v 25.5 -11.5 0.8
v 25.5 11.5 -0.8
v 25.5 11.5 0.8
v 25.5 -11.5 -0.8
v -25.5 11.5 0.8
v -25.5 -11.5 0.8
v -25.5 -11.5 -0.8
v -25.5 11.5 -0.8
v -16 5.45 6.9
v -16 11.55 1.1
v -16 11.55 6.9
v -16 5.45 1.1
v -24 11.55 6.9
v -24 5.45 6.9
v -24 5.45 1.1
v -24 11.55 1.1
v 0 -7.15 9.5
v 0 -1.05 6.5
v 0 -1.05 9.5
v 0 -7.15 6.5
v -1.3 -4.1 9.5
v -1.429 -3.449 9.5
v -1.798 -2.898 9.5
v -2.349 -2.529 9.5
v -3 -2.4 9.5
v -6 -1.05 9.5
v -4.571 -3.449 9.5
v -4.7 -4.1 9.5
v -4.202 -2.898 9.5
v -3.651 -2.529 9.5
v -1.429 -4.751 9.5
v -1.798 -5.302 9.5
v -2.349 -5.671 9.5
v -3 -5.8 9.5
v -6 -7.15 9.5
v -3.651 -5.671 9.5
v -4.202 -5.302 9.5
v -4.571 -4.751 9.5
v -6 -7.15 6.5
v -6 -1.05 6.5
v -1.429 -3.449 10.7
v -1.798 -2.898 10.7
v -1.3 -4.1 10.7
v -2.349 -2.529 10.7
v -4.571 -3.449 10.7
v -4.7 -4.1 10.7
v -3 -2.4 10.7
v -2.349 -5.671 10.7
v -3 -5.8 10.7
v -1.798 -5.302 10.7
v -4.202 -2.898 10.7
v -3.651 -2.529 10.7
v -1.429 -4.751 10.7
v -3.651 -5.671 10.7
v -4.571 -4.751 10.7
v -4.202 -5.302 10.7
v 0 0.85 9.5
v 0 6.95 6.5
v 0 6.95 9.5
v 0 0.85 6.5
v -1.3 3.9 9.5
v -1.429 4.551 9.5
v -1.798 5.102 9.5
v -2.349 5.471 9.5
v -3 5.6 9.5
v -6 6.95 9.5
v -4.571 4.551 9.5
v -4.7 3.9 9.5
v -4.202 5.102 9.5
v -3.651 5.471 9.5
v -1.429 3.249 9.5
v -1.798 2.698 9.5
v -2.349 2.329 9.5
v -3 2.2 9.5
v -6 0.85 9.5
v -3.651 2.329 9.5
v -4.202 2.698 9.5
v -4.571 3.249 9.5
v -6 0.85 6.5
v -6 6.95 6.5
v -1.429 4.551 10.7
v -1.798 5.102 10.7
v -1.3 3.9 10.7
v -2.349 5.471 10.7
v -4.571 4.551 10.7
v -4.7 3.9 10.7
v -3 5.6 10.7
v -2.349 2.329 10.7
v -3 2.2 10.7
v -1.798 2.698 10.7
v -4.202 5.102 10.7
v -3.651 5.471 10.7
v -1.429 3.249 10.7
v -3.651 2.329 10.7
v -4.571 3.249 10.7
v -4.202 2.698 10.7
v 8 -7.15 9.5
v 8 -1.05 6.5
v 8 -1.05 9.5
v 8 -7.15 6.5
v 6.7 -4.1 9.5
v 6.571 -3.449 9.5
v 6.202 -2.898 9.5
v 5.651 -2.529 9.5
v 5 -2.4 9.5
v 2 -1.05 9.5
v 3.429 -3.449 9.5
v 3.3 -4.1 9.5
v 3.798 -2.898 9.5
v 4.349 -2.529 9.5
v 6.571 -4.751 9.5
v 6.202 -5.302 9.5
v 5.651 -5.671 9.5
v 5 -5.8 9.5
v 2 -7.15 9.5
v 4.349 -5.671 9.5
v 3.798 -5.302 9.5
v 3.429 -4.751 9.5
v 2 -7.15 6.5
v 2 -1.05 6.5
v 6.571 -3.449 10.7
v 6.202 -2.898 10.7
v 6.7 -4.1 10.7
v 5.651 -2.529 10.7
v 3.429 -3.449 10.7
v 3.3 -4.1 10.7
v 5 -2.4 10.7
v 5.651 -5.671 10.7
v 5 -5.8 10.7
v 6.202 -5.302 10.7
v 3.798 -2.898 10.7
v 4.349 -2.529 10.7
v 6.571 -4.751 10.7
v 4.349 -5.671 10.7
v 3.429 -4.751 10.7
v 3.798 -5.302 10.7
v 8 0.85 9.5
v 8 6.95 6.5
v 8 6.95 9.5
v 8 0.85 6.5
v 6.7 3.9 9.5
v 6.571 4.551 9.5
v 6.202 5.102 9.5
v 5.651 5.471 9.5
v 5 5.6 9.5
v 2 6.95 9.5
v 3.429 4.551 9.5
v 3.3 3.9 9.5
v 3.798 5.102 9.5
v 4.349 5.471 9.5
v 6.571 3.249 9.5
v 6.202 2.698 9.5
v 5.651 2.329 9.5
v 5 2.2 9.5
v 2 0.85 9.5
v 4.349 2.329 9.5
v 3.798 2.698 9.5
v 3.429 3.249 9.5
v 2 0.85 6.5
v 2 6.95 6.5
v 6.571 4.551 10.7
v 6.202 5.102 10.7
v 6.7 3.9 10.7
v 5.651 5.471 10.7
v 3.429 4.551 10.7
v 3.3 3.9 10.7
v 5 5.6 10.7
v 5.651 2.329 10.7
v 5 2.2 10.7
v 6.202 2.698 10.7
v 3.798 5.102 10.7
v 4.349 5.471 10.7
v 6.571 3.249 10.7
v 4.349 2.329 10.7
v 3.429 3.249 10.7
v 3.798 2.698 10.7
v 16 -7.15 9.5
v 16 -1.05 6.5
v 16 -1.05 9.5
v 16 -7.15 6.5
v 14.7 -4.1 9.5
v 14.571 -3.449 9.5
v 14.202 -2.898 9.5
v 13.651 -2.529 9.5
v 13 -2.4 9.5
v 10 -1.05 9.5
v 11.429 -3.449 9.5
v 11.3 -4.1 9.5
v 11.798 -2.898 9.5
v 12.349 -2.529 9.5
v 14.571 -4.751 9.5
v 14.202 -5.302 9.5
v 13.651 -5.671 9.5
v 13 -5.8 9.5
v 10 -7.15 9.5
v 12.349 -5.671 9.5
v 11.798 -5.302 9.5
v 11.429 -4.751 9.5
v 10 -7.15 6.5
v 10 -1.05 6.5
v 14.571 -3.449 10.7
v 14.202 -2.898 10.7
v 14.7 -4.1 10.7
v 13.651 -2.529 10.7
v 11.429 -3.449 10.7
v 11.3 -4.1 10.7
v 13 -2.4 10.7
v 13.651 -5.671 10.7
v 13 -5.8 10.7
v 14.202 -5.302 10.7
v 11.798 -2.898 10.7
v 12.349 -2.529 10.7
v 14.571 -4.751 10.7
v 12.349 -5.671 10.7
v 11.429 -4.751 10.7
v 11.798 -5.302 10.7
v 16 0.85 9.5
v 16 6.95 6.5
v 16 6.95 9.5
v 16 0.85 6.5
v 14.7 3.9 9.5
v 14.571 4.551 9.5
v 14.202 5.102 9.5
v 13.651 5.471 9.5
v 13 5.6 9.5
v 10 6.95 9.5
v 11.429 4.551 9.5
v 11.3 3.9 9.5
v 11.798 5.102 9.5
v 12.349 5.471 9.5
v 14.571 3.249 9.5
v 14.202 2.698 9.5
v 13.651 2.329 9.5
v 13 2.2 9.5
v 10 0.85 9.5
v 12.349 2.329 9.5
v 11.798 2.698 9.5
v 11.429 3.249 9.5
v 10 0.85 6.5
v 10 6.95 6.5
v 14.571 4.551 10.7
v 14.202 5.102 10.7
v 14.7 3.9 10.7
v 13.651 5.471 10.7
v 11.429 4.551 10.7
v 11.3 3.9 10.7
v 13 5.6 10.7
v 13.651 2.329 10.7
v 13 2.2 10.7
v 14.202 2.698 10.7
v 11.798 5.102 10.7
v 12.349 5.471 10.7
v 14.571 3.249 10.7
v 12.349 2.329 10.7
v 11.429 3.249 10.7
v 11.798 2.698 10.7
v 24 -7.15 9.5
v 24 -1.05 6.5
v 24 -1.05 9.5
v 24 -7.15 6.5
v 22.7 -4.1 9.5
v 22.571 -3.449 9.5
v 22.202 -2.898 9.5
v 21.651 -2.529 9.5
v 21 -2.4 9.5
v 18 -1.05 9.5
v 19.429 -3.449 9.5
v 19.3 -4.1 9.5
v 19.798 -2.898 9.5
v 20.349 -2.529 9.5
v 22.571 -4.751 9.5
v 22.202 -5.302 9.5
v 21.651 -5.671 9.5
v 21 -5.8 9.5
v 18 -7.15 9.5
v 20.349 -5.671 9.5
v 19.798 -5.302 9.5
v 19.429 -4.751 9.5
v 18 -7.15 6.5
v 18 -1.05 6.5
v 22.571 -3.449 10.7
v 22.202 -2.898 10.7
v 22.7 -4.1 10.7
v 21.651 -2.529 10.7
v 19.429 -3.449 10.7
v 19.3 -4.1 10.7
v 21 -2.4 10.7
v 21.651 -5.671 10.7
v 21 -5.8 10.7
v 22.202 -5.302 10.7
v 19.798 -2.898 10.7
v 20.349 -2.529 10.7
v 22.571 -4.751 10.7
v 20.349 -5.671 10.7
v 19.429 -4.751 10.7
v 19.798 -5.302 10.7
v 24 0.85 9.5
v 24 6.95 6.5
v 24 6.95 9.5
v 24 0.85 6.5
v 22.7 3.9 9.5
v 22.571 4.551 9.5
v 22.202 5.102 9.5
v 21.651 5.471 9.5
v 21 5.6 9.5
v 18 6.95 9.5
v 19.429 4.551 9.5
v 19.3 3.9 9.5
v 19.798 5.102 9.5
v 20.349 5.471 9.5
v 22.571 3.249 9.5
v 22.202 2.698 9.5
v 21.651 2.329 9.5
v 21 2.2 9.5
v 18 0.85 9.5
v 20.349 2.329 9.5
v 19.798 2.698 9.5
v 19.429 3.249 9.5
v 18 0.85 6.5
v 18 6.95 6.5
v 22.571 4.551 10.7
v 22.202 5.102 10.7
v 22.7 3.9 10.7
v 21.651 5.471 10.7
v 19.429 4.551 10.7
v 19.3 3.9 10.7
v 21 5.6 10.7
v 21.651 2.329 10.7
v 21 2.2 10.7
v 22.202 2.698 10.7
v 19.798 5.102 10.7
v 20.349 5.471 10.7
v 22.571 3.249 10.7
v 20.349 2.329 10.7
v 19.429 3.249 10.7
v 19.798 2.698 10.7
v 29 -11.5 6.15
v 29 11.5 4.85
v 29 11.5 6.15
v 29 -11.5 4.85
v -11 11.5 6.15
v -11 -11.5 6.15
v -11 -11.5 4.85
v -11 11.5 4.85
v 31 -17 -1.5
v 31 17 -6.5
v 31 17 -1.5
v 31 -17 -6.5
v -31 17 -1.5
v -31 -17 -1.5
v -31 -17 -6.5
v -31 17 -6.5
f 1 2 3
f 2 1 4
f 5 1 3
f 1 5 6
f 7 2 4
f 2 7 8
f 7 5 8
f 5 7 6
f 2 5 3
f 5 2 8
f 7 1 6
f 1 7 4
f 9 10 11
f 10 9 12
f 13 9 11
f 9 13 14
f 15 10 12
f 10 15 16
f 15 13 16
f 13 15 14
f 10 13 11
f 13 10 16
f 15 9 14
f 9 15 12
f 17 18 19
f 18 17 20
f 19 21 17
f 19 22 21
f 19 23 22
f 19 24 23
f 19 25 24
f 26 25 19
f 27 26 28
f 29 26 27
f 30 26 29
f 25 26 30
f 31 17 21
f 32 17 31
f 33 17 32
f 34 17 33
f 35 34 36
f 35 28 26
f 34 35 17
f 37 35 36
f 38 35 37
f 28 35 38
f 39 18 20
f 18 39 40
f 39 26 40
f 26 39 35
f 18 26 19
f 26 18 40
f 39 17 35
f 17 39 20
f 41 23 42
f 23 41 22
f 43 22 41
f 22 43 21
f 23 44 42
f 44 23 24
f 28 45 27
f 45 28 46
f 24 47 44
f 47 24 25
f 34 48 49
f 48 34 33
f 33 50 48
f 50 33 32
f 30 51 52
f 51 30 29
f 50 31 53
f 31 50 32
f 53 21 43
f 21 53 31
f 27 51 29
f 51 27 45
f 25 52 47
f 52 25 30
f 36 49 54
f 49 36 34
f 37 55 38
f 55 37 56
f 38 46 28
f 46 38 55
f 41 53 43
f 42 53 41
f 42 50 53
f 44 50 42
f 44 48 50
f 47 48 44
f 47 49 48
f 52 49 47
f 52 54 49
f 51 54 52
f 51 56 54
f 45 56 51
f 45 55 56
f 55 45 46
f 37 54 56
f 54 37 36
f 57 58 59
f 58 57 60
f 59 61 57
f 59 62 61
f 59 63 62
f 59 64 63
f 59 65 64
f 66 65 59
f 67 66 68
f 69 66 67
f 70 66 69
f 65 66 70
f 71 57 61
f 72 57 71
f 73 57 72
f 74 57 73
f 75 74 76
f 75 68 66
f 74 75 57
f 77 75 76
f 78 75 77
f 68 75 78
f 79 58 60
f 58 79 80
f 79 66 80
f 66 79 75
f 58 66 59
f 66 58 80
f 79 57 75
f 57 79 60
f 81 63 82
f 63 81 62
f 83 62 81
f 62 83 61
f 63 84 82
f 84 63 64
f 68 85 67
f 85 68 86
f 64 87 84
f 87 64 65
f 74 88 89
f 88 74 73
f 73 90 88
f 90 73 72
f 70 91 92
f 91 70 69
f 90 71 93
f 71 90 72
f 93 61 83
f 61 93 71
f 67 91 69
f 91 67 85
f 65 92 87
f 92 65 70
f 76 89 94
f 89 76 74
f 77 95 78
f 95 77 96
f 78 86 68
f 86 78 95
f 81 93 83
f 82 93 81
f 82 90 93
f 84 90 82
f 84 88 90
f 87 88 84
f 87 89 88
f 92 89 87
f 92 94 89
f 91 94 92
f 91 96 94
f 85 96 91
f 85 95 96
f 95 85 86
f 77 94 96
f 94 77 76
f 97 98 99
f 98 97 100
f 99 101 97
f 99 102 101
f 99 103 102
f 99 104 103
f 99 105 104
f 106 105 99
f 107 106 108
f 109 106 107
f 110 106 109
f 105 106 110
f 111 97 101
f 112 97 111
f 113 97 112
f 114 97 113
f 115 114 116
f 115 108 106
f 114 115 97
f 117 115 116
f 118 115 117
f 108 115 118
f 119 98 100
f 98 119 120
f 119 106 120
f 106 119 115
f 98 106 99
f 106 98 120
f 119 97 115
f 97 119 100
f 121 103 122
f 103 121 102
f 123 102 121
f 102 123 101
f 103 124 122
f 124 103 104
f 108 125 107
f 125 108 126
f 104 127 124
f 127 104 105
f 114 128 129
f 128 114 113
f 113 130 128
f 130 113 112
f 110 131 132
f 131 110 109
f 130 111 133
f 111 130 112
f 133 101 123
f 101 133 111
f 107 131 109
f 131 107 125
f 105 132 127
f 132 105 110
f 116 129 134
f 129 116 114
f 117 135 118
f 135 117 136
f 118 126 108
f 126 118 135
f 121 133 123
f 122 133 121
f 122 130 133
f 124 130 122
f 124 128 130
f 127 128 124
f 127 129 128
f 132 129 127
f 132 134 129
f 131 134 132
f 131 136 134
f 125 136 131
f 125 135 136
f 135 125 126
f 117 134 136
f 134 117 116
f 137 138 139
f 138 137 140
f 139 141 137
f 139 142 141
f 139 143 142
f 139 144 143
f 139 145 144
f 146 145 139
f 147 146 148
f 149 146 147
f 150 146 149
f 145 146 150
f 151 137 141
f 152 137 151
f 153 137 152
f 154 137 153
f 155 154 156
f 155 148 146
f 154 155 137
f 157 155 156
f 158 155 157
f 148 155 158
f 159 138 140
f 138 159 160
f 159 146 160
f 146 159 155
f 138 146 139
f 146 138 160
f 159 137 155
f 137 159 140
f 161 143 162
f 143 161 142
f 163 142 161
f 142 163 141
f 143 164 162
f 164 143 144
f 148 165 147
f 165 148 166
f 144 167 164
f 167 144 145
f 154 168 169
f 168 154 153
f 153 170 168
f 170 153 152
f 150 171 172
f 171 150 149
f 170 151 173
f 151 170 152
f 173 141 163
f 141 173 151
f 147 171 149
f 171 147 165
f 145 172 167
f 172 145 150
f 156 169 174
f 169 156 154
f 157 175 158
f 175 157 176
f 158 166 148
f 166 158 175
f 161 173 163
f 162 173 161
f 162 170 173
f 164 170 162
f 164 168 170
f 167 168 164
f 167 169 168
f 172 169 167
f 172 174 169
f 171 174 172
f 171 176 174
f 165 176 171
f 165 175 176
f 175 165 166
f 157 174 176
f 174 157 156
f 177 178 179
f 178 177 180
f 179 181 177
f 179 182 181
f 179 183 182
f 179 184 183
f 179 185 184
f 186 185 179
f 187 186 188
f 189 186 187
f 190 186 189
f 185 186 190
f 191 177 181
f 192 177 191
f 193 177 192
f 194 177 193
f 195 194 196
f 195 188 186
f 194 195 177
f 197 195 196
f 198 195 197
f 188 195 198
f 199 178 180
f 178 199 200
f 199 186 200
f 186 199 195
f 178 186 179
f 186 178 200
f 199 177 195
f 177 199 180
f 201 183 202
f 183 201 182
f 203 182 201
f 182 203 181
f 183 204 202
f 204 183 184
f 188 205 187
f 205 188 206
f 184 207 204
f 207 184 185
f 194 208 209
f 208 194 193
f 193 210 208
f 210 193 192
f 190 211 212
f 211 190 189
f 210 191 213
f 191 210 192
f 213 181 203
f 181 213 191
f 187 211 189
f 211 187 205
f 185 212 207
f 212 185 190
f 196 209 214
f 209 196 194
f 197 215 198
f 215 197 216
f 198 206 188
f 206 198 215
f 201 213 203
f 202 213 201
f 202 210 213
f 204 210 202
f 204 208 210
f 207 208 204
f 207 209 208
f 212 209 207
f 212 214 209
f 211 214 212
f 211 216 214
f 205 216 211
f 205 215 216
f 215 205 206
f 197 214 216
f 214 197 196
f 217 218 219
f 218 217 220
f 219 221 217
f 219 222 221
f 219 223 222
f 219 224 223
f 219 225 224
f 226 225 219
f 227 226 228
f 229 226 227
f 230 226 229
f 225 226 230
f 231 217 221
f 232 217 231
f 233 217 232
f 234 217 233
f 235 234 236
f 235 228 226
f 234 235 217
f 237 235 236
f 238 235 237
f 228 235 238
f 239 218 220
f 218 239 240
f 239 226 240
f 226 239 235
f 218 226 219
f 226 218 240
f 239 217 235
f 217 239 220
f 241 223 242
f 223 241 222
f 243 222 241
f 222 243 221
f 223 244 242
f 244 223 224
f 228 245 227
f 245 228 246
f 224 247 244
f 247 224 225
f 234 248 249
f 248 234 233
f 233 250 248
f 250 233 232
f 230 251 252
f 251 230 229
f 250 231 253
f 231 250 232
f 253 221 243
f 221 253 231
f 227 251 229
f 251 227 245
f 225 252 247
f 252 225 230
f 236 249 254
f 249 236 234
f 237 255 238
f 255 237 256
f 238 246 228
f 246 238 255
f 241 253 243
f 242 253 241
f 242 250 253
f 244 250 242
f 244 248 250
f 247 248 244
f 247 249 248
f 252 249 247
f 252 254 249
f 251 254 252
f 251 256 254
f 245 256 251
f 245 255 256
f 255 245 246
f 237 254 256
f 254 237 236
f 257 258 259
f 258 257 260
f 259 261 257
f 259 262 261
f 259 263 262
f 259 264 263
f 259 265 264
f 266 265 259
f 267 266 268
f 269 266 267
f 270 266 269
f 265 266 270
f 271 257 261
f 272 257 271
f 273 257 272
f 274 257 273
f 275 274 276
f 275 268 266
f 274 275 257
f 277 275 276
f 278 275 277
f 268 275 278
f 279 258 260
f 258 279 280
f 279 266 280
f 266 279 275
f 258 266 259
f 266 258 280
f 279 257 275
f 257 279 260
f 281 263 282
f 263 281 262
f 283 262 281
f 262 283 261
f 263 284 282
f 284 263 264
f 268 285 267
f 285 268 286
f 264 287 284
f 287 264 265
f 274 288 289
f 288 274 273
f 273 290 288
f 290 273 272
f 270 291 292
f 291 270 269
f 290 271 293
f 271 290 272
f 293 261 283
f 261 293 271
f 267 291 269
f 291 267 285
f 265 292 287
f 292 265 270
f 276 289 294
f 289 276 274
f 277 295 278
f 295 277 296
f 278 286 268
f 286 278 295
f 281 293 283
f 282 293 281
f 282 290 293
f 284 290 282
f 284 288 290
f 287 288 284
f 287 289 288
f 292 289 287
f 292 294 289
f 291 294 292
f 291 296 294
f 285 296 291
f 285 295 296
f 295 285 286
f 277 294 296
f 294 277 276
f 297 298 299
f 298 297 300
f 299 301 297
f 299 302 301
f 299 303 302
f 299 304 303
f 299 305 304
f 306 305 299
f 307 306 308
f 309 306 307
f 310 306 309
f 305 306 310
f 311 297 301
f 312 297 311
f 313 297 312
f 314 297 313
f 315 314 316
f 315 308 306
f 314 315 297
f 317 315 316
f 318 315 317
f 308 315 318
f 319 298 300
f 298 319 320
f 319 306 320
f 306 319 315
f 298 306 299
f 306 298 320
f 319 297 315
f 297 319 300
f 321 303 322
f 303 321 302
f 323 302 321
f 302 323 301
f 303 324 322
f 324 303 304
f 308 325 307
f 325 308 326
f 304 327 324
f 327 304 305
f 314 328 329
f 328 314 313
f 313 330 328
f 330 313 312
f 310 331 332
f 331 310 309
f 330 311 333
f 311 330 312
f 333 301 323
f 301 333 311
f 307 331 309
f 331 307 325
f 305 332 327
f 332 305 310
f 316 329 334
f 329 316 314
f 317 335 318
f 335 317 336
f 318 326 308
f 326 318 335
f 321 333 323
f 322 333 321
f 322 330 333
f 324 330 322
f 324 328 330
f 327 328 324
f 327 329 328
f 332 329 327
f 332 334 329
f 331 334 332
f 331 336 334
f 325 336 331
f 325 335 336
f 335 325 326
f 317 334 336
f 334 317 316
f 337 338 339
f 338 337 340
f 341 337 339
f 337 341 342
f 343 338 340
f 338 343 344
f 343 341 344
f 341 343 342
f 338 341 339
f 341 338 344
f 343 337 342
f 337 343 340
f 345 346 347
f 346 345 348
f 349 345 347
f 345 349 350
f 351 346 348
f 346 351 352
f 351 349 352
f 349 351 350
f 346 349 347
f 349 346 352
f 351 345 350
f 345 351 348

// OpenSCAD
// 51mm x 23mm x 7.18mm(1.6mm board thickness)
// Feather - Adafruit: Adafruit Feather 32u4 Bluefruit LE
translate([0, 0, 0])
union(){
    color([10/255, 20/255, 20/255])
    cube(size=[51, 23, 1.6], center=true);
    translate([-20, 8.5, 4])
    cube(size=[8, 6.1, 5.8], center=true);
}


// 62mm x 34mm  x 5mm
// Battery - Adafruit: Lithium Ion Polymer Battery - 3.7v 1200mAh
color([200/255, 200/255, 200/255])
translate([0, 0, -4])
cube(size=[62, 34, 5], center=true);

translate([9, 0, 0])
union(){
    // 59mm x 23mm x 1.3mm
    // Button Board
    color([0/255, 100/255, 0/255])
    translate([0, 0, 5.5])
    cube(size=[40, 23, 1.3], center=true);

    // 6.0mm x 6.1mm x 3.0mm
    // Button - Adafruit: Tactile Button switch (6mm) x 20 pack
    // Doesn't include legs or button ontop

    for (x=[0:3]) {
        for (y=[0:1]) {
            translate([(x*8)-12, (y*8)-4.1, 8])
            union(){
                button();
            }
        }
    }

}

module button() {
    color([0/255, 0/255, 0/255])
    cube(size=[6, 6.1, 3], center=true);
    translate([0, 0, 1.8])
    color([255/255, 255/255, 255/255])
    cylinder(d=3.4, h=1.8, center=true, $fn=16);
}
